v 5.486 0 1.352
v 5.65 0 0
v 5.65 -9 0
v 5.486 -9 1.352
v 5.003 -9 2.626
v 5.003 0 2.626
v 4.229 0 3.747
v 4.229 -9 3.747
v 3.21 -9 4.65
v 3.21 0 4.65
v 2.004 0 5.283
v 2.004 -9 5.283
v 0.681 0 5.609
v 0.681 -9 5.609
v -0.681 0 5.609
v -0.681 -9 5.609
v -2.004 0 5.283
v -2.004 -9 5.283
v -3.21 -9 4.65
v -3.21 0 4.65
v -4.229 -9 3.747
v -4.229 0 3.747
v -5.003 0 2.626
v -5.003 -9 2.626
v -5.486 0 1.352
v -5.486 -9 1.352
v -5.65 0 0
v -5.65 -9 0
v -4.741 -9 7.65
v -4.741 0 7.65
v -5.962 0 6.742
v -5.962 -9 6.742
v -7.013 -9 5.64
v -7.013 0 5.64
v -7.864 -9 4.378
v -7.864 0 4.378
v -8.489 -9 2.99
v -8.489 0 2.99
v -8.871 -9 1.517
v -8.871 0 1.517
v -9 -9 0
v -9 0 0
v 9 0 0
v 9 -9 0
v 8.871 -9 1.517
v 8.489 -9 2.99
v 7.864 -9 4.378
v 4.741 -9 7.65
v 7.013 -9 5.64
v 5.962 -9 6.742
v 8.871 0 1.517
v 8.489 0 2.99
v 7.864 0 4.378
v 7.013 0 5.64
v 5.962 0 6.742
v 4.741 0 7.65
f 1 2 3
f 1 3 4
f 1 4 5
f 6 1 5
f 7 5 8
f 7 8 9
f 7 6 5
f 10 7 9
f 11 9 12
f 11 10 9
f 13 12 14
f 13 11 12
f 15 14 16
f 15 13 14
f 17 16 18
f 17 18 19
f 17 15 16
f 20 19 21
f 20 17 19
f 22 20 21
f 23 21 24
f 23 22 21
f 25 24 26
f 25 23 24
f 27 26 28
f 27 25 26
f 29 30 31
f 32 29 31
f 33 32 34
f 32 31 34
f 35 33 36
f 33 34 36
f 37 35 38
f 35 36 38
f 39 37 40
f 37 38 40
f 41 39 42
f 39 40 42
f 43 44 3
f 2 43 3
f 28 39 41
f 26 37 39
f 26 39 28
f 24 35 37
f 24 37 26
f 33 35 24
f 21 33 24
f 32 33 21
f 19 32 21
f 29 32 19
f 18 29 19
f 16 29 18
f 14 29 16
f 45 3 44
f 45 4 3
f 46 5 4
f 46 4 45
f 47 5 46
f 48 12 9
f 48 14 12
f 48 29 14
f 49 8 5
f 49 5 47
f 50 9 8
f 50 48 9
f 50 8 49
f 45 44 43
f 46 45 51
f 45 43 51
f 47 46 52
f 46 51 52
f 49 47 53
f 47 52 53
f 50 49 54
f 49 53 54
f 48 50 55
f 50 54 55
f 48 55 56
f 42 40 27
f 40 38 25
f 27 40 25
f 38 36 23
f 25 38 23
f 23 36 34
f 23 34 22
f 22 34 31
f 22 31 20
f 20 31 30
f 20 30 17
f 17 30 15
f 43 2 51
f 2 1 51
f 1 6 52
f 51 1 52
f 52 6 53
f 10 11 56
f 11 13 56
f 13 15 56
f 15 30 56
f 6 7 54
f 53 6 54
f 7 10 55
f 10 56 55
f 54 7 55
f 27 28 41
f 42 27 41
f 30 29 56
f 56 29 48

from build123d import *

# Parameters (mm, degrees)
F0_R     = 9
F0_R_2   = 5.65
F1_DEPTH = 9
F3_DEPTH = 25
F5_DEPTH = 25


with BuildPart() as f1:
    # F0 (on Front) → F1 (new body)
    with BuildSketch(Plane.XZ):
        Circle(F0_R)
        Circle(F0_R_2, mode=Mode.SUBTRACT)
    extrude(amount=F1_DEPTH)

    # F2 (on face) → F3 (cut)
    with BuildSketch(Plane.XZ.offset(9)):
        Polygon((9.609743, 0), (-9, 0), (-9.972616, 0), (-9.972616, -10.801357), (9.609743, -10.801357), align=None)
    extrude(amount=-F3_DEPTH, mode=Mode.SUBTRACT)

    # F4 (on face) → F5 (cut)
    with BuildSketch(Plane.XZ.offset(9)):
        Polygon((-7.133957, 7.65), (0, 7.65), (5.867002, 7.65), (5.867002, 11.901876), (-7.133957, 11.901876), align=None)
    extrude(amount=-F5_DEPTH, mode=Mode.SUBTRACT)


solid = f1.part
